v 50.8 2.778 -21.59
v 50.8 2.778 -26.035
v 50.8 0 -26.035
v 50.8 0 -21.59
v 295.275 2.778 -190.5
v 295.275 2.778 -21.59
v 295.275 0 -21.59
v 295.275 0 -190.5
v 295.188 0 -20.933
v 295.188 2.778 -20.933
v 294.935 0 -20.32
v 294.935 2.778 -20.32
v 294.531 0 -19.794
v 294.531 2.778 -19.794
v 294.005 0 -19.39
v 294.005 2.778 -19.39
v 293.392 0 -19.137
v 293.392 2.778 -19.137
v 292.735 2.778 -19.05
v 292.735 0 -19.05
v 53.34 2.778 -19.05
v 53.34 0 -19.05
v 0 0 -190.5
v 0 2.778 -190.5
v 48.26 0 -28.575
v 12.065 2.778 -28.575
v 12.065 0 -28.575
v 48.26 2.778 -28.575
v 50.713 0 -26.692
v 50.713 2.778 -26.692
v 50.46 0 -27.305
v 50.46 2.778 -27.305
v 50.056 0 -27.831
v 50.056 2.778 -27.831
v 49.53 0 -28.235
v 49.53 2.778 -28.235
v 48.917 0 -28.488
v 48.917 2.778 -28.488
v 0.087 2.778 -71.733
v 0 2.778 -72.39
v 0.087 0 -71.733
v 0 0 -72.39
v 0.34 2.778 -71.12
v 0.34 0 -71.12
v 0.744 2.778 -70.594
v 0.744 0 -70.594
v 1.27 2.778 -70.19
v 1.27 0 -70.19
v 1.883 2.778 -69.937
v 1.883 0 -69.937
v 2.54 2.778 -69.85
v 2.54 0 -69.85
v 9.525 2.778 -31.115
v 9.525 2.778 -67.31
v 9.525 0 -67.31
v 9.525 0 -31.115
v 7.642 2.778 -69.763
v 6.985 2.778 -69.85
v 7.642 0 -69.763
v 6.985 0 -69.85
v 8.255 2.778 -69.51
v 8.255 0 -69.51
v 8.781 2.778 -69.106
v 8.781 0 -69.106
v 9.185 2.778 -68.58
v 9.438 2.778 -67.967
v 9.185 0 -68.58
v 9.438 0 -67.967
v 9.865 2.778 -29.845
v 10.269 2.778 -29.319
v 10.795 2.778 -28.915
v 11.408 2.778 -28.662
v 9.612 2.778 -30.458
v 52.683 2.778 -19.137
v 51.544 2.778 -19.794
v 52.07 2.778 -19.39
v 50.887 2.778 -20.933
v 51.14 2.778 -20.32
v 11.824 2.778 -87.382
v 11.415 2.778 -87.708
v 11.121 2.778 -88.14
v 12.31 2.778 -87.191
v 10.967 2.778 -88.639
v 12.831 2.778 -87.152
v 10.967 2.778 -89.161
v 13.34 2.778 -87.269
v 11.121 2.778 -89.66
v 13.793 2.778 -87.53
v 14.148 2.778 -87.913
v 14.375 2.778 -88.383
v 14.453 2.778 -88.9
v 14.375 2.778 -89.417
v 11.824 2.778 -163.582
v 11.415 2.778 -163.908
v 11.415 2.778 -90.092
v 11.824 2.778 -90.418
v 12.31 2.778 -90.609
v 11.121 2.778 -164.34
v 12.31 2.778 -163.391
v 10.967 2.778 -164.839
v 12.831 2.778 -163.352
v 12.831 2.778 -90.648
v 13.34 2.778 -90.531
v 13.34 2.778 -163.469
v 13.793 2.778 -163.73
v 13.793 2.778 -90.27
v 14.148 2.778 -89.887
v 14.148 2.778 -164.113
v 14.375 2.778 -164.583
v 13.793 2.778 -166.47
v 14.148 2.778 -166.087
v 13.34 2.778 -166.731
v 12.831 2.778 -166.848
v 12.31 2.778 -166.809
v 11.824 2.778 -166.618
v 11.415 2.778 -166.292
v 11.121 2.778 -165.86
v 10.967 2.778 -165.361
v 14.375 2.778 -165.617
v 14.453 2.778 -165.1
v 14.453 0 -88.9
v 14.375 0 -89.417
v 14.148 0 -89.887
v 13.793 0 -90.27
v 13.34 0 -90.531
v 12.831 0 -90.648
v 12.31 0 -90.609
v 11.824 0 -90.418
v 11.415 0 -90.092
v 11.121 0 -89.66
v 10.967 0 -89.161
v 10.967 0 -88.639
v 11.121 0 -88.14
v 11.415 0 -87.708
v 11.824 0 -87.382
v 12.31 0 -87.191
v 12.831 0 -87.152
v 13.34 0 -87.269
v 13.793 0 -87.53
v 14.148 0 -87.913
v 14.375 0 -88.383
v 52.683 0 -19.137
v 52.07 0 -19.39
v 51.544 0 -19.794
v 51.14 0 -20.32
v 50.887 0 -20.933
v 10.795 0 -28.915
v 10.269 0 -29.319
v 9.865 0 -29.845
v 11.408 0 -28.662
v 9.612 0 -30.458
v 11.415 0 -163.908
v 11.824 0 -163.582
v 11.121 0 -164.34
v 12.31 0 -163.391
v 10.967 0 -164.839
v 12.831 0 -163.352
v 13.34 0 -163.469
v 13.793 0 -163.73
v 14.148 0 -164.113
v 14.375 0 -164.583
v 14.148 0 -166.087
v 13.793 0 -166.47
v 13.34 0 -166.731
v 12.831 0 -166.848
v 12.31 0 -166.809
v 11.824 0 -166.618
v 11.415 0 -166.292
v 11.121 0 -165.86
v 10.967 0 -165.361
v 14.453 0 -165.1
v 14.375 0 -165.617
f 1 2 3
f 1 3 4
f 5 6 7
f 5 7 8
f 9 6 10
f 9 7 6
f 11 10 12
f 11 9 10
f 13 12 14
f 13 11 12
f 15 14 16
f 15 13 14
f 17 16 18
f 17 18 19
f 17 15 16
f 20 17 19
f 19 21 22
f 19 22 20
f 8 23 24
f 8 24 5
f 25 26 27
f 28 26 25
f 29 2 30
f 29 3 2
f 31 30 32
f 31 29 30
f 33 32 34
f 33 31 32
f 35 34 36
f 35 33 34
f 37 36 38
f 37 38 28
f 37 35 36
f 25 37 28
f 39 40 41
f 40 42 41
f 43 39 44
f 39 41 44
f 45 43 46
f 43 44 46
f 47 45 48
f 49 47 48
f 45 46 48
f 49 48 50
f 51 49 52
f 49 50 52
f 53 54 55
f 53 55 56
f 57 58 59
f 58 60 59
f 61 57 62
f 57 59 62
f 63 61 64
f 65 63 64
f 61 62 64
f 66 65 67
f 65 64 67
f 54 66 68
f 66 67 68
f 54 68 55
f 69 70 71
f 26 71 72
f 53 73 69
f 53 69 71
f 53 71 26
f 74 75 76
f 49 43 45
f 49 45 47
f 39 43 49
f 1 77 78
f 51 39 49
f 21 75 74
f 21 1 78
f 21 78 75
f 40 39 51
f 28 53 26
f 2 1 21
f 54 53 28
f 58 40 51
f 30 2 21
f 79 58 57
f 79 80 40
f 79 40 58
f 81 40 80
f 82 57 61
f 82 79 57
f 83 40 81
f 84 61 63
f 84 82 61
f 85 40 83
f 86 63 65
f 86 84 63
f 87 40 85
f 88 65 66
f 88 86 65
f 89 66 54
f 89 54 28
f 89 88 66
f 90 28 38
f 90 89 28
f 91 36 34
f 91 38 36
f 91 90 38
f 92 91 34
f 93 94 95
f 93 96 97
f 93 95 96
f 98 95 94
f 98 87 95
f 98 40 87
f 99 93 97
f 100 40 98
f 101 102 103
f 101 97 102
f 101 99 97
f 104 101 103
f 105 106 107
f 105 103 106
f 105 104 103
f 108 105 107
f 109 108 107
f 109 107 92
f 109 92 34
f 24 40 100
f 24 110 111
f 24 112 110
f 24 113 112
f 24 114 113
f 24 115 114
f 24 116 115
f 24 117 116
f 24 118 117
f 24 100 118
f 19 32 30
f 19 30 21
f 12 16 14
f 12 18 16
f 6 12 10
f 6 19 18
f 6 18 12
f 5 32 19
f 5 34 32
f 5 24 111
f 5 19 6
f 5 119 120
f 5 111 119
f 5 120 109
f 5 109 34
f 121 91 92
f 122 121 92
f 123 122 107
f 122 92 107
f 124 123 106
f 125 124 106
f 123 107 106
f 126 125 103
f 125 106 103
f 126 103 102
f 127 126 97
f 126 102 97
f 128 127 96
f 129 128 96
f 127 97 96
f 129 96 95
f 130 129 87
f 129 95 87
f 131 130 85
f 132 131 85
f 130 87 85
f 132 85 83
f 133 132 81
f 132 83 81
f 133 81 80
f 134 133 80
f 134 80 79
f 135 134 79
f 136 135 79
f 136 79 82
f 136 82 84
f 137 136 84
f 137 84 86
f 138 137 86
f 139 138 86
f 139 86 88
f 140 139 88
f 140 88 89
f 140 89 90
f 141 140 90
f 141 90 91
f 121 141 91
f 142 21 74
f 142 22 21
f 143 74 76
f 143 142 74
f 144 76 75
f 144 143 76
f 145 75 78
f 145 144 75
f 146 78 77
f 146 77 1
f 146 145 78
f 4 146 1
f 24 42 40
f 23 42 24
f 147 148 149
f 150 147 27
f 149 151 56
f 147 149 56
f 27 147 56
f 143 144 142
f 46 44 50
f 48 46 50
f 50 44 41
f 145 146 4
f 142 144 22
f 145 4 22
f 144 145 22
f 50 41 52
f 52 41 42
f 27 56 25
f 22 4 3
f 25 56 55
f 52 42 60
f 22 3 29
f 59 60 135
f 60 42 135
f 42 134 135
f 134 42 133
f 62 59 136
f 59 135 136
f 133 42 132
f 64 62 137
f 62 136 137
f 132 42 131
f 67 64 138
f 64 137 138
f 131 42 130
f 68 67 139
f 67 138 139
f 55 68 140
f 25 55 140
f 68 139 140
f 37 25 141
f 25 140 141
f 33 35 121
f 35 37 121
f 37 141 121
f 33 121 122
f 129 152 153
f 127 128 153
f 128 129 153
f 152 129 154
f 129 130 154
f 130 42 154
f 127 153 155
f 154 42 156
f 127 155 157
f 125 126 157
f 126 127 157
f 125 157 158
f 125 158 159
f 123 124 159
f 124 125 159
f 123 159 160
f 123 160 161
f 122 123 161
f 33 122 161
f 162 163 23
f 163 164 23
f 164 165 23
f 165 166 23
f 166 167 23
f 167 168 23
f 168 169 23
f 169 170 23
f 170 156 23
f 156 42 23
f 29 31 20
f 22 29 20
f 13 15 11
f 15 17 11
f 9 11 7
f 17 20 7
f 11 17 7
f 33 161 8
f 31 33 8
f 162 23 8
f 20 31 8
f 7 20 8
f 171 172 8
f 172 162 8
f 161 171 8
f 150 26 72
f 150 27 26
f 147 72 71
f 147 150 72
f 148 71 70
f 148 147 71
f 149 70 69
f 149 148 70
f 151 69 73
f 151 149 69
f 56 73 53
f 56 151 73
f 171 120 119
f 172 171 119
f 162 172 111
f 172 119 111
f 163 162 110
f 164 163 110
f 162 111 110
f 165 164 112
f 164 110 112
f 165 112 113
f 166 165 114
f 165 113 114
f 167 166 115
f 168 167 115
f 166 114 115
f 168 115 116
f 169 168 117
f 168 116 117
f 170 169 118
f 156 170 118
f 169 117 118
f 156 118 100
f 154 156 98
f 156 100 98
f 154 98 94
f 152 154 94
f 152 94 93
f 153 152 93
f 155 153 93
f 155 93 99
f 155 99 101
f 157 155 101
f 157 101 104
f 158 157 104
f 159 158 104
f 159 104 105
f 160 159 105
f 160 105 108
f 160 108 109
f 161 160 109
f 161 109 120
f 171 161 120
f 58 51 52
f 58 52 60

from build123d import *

# Parameters (mm, degrees)
SKETCH1_W           = 304.8
SKETCH1_H           = 190.5
BOSS_EXTRUDE1_DEPTH = 2.778125
SKETCH2_W           = 304.8
SKETCH2_H           = 19.05
CUT_EXTRUDE1_DEPTH  = 3.778125
CUT_EXTRUDE2_DEPTH  = 3.778125
SKETCH4_R           = 1.7526
CUT_EXTRUDE3_DEPTH  = 3.778125
SKETCH5_W           = 9.525
SKETCH5_H           = 171.45
CUT_EXTRUDE4_DEPTH  = 3.778125
FILLET1_R           = 2.54


with BuildPart() as part:
    # Sketch1 → Boss-Extrude1 (new body)
    with BuildSketch(Plane(origin=(0, 0, 0), x_dir=(1, 0, 0), z_dir=(0, 1, 0))):
        with Locations((152.4, 95.25)):
            Rectangle(SKETCH1_W, SKETCH1_H)
    extrude(amount=BOSS_EXTRUDE1_DEPTH)

    # Sketch2 → Cut-Extrude1 (cut, through all)
    with BuildSketch(Plane(origin=(0, 2.778125, 0), x_dir=(1, 0, 0), z_dir=(0, 1, 0))):
        with Locations((152.4, 9.525)):
            Rectangle(SKETCH2_W, SKETCH2_H)
    extrude(amount=-CUT_EXTRUDE1_DEPTH, mode=Mode.SUBTRACT)

    # Sketch3 → Cut-Extrude2 (cut, through all)
    with BuildSketch(Plane(origin=(0, 2.778125, 0), x_dir=(1, 0, 0), z_dir=(0, 1, 0))):
        Polygon((0, 19.05), (0, 69.85), (9.525, 69.85), (9.525, 28.575), (50.8, 28.575), (50.8, 19.05), align=None)
    extrude(amount=-CUT_EXTRUDE2_DEPTH, mode=Mode.SUBTRACT)

    # Sketch4 → Cut-Extrude3 (cut, through all)
    with BuildSketch(Plane(origin=(0, 2.778125, 0), x_dir=(1, 0, 0), z_dir=(0, 1, 0))):
        with Locations((12.7, 165.1)):
            Circle(SKETCH4_R)
        with Locations((12.7, 88.9)):
            Circle(SKETCH4_R)
    extrude(amount=-CUT_EXTRUDE3_DEPTH, mode=Mode.SUBTRACT)

    # Sketch5 → Cut-Extrude4 (cut, through all)
    with BuildSketch(Plane(origin=(0, 2.778125, 0), x_dir=(1, 0, 0), z_dir=(0, 1, 0))):
        with Locations((300.0375, 104.775)):
            Rectangle(SKETCH5_W, SKETCH5_H)
    extrude(amount=-CUT_EXTRUDE4_DEPTH, mode=Mode.SUBTRACT)

    # Fillet1
    fillet1_edges = [part.edges().sort_by_distance(p)[0] for p in [
        (50.8, 1.3890625, -19.05),
        (0, 1.3890625, -69.85),
        (9.525, 1.3890625, -69.85),
        (9.525, 1.3890625, -28.575),
        (50.8, 1.3890625, -28.575),
        (295.275, 1.3890625, -19.05),
    ]]
    fillet(fillet1_edges, radius=FILLET1_R)


solid = part.part
